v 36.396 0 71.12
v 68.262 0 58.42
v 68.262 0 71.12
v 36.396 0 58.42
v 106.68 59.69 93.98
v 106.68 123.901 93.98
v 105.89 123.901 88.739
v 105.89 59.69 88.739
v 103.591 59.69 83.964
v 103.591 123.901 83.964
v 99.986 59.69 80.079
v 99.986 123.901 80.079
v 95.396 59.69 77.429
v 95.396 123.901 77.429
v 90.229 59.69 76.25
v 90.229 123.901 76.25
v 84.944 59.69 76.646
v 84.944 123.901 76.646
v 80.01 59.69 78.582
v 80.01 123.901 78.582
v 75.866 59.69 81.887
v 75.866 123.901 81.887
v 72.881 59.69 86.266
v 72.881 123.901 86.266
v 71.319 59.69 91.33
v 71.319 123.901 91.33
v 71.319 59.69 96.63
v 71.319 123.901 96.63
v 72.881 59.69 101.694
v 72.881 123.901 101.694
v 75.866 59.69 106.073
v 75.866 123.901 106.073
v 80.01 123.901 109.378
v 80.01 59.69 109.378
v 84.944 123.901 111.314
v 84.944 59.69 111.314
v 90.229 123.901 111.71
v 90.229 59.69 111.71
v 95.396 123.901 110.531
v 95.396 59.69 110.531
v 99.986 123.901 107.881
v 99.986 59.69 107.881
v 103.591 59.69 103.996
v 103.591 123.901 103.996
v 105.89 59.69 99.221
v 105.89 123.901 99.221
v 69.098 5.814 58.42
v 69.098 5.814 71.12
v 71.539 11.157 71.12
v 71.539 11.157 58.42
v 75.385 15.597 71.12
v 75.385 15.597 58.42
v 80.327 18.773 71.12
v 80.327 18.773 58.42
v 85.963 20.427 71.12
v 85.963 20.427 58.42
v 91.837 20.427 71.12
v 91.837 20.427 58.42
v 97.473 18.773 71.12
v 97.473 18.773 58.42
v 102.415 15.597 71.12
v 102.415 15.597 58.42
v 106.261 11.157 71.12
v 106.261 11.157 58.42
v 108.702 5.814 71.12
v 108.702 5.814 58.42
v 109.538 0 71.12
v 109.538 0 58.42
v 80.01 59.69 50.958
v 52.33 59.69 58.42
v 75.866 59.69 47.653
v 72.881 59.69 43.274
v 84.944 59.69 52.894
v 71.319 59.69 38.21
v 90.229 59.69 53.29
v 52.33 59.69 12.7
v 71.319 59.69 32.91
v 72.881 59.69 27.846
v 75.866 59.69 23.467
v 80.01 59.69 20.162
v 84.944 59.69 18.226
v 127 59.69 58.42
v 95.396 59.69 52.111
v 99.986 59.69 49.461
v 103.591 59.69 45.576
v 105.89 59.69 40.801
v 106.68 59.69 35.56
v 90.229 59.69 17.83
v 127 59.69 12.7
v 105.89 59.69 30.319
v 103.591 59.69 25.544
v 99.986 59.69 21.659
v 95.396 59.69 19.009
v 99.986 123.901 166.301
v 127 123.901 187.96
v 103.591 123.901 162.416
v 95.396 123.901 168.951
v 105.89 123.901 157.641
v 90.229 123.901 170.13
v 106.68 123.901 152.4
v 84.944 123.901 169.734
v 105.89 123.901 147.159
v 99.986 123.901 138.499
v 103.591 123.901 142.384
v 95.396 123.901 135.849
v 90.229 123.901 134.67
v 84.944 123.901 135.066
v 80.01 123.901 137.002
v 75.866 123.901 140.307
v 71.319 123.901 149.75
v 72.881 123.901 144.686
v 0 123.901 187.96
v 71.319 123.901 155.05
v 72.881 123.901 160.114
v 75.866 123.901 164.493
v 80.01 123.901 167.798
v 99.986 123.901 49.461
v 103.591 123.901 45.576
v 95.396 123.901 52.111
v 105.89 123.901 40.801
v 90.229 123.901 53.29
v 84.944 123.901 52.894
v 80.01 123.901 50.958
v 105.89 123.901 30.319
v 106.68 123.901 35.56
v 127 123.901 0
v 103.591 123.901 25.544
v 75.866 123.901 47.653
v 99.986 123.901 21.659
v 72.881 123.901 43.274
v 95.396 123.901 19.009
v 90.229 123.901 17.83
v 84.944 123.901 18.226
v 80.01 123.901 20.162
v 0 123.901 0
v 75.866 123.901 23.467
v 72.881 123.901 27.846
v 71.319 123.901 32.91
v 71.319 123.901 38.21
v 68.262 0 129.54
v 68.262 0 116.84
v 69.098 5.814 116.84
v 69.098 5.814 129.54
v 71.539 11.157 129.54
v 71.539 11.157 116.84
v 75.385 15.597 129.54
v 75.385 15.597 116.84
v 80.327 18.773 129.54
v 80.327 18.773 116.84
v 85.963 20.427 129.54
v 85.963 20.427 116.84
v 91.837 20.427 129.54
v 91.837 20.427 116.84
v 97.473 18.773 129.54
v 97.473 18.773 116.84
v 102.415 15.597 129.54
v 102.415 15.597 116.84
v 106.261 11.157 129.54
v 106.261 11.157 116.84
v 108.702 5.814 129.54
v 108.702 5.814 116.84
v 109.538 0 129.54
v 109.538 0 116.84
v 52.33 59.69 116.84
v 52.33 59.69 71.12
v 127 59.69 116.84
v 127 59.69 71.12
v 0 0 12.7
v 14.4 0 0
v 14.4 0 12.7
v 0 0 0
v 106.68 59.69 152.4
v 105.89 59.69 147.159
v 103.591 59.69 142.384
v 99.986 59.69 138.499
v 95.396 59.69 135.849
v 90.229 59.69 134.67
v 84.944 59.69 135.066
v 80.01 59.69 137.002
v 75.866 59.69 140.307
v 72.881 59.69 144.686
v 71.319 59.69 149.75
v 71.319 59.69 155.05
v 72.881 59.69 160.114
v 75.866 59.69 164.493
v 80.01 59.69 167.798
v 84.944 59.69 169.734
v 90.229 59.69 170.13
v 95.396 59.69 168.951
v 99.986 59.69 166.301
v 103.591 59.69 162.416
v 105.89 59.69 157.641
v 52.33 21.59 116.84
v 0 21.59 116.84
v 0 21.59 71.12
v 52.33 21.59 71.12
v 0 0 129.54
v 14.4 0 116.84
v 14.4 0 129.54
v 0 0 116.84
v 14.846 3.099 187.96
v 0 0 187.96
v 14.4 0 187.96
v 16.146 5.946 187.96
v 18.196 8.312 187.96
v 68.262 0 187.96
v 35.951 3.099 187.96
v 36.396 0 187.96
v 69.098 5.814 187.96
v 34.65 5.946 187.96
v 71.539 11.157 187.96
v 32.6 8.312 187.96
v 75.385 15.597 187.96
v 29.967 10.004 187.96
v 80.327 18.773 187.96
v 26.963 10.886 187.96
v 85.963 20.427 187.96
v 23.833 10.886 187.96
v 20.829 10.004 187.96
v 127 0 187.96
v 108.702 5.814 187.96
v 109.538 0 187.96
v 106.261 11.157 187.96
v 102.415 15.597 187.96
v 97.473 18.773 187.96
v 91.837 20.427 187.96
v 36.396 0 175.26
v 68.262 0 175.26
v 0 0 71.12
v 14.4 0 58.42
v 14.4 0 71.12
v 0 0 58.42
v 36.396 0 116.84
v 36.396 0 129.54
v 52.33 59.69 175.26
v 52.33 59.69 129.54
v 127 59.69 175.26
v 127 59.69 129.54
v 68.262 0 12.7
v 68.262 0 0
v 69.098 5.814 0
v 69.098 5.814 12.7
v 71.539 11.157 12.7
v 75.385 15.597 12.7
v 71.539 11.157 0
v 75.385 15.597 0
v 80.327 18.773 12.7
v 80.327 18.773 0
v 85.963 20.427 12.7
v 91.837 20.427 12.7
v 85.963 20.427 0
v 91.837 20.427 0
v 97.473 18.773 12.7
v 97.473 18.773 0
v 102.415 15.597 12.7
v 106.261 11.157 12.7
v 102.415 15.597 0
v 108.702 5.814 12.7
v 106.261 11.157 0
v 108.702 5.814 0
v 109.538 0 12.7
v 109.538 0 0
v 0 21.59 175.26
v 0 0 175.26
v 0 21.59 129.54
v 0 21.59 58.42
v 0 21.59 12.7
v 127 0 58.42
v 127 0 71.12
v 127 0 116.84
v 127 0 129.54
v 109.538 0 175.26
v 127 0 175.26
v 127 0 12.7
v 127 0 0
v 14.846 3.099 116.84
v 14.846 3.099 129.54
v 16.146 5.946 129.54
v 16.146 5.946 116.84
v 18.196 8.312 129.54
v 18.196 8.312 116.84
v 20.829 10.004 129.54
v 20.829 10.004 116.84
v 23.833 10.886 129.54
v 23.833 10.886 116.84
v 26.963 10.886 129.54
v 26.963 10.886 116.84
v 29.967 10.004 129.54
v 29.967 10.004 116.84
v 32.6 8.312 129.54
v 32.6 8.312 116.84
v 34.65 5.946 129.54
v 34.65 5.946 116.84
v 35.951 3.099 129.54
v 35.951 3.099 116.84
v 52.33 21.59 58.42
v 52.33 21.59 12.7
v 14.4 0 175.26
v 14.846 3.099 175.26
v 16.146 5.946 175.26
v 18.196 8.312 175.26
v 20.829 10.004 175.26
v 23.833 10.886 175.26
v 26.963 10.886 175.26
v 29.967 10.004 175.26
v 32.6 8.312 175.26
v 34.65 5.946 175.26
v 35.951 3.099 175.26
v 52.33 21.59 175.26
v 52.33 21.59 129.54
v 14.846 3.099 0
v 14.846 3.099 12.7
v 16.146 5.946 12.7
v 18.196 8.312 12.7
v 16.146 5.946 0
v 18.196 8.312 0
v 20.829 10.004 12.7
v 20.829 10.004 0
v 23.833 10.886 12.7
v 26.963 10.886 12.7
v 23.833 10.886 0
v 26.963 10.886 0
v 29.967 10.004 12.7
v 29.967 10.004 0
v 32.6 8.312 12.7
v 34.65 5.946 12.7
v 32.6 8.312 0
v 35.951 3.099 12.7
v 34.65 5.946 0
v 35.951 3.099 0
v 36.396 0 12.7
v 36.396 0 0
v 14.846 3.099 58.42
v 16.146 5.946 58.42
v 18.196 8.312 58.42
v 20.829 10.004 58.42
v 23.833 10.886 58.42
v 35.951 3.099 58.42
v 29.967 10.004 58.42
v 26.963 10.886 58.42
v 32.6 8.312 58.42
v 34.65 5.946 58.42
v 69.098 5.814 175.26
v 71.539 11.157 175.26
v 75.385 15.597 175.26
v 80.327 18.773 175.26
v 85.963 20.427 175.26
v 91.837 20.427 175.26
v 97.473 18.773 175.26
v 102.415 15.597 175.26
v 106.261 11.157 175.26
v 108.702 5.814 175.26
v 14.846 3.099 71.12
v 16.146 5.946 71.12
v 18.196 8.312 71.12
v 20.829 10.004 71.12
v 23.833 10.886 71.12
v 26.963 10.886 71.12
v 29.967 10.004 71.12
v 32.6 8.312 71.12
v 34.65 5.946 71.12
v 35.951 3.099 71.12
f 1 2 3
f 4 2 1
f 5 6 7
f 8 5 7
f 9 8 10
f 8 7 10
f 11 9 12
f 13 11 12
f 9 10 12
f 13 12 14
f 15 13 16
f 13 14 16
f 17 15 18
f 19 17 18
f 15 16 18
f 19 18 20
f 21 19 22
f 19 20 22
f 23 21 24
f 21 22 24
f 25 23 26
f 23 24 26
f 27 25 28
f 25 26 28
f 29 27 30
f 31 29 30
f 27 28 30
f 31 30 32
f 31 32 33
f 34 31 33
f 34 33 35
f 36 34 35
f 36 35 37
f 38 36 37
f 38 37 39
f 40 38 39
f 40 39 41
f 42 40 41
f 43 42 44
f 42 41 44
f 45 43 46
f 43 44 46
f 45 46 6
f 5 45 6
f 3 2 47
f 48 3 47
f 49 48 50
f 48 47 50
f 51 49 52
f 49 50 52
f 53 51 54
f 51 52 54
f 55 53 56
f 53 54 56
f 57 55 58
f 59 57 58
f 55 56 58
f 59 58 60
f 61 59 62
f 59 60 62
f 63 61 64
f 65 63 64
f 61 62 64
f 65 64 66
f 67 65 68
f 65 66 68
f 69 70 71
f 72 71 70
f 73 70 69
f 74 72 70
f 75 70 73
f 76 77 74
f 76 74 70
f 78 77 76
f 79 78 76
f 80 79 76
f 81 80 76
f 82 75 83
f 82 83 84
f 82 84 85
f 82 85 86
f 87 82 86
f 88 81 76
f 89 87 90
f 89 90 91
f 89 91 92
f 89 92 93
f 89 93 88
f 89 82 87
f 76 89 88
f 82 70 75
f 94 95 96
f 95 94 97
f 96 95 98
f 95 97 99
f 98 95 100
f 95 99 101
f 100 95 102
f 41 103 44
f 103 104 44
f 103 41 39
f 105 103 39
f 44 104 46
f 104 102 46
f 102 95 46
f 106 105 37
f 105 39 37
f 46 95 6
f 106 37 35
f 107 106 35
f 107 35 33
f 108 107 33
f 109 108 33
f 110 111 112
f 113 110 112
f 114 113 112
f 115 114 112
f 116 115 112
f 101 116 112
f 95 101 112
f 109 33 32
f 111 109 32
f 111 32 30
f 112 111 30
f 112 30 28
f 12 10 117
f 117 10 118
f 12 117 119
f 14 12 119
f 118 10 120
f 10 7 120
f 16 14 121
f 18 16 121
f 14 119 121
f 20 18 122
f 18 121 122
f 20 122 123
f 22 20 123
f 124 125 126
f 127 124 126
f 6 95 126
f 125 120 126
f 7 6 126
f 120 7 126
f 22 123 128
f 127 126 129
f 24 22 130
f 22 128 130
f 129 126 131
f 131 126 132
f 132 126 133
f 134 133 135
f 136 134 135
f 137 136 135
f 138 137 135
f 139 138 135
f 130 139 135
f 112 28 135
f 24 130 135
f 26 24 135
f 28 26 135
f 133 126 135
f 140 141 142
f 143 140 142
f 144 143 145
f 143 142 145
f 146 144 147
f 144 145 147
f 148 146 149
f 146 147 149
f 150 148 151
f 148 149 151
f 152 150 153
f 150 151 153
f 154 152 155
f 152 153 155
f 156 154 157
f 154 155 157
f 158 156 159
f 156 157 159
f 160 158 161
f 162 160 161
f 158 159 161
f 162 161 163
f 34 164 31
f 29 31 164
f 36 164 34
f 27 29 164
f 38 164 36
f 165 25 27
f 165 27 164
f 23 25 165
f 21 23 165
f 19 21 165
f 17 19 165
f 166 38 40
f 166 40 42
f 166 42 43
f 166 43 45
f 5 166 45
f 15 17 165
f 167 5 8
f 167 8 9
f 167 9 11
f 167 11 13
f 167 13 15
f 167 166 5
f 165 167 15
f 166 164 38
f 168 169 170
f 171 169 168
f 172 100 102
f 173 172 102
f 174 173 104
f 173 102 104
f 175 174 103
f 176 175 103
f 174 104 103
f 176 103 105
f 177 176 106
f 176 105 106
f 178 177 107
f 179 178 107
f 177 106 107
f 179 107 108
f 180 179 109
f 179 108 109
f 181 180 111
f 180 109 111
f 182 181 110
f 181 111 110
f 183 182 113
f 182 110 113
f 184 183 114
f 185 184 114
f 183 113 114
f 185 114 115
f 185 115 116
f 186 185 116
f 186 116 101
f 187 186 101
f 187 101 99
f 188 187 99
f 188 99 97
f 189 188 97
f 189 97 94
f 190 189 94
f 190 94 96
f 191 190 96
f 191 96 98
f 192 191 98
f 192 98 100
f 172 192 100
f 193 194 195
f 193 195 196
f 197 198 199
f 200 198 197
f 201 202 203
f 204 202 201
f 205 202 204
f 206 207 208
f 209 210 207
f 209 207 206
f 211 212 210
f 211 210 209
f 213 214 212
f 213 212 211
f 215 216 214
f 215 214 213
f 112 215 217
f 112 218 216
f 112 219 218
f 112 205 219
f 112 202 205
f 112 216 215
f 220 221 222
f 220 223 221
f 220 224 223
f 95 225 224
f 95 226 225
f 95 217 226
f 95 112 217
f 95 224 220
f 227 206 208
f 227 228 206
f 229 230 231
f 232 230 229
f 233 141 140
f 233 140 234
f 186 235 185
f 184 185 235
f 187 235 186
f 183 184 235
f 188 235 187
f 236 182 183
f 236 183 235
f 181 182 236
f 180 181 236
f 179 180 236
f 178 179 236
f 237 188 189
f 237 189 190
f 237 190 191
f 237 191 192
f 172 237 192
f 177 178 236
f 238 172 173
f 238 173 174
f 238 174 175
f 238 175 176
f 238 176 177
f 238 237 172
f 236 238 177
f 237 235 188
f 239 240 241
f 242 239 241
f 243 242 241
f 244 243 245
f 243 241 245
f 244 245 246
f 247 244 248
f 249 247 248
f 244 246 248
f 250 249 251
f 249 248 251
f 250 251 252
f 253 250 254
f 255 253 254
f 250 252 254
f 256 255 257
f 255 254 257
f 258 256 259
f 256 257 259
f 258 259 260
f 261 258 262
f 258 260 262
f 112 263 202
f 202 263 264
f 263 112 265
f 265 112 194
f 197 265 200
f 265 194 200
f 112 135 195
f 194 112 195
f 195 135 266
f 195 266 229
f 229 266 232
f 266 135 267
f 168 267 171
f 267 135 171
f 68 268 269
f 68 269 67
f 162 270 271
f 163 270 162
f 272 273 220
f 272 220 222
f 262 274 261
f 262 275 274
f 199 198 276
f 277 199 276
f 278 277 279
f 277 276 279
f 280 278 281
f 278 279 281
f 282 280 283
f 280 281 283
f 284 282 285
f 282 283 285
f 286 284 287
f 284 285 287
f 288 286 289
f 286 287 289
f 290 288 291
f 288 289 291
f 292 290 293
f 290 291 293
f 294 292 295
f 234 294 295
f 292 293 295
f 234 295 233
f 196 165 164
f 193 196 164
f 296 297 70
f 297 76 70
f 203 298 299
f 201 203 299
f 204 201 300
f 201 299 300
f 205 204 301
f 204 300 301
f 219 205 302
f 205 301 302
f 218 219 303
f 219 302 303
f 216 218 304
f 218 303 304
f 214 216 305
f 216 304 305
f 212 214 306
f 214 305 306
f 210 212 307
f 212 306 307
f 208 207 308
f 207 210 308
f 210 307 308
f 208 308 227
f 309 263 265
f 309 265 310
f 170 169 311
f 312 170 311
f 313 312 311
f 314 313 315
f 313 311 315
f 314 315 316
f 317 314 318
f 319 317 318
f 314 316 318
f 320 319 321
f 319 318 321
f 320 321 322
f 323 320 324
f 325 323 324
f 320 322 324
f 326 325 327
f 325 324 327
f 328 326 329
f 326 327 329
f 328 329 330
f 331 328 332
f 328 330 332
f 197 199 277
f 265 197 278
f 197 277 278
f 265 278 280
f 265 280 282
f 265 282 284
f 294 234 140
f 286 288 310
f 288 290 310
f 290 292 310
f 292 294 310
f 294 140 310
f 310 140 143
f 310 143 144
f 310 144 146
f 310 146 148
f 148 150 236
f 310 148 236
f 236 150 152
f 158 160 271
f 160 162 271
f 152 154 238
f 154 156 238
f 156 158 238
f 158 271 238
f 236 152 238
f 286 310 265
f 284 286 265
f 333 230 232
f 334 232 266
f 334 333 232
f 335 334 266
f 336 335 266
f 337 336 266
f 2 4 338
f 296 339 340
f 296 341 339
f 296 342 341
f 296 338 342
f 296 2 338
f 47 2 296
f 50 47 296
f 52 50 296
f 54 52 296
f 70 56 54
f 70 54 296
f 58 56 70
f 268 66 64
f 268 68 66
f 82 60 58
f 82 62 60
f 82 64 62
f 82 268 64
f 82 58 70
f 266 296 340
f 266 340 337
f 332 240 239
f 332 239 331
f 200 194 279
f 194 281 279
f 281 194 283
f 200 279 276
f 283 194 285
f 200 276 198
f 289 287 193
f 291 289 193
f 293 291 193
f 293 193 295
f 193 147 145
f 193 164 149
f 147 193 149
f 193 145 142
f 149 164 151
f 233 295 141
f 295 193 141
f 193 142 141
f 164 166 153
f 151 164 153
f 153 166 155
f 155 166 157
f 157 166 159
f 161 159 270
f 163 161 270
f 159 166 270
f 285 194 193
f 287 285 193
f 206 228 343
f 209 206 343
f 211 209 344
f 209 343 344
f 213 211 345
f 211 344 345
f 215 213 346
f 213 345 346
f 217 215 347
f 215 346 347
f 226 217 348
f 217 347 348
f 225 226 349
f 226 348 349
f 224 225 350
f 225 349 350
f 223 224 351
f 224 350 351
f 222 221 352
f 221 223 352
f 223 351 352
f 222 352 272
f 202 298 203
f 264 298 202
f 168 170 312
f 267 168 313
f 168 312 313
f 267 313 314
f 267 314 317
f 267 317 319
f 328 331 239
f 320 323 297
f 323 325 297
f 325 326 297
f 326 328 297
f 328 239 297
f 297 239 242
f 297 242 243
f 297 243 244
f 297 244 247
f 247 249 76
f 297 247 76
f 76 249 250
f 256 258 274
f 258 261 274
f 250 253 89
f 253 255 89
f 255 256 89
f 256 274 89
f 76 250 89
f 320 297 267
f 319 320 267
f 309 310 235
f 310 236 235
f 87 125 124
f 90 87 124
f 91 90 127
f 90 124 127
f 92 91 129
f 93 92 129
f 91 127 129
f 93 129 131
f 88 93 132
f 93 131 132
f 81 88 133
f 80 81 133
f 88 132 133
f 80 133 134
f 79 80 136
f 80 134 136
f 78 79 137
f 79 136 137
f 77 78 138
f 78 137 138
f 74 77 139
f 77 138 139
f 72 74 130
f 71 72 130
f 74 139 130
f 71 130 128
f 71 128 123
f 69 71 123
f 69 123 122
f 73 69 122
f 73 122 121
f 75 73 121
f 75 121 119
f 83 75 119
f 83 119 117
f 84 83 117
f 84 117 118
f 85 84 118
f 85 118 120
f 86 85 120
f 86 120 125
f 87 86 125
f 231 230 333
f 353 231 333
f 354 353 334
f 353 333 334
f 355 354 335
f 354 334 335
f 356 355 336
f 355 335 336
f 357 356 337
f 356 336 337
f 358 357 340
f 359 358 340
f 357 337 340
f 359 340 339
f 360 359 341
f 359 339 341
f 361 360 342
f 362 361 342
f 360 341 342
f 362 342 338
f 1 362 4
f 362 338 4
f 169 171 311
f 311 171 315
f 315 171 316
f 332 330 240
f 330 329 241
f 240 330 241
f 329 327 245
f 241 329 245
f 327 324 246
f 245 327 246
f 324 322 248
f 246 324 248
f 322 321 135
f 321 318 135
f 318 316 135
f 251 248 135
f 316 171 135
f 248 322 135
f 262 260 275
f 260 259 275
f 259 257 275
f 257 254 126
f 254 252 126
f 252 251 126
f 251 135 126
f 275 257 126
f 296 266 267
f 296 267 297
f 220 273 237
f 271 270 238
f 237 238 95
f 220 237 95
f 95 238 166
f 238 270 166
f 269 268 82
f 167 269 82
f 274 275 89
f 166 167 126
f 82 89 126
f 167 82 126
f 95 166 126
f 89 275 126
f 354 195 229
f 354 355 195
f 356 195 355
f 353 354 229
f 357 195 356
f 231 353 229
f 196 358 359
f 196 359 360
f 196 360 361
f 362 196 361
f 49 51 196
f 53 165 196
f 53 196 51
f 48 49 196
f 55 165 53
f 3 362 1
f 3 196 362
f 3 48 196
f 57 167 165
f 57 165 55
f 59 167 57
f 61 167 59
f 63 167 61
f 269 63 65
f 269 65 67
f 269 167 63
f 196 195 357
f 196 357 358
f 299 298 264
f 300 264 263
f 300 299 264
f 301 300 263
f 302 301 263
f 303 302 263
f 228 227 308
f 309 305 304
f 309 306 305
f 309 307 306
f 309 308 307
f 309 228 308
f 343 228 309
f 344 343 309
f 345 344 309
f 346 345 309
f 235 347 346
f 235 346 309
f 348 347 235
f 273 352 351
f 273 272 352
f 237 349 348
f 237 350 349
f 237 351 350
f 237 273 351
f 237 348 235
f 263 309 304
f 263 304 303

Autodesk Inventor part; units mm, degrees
ref_plane "YZ Plane" through (0, 0, 0) normal (1, 0, 0) x (0, 1, 0)
ref_plane "XZ Plane" through (0, 0, 0) normal (0, 1, 0) x (-1, 0, 0)
ref_plane "XY Plane" through (0, 0, 0) normal (0, 0, 1) x (1, 0, 0)
sketch "Sketch1" plane through (0, 0, 0) normal (0, 0, 1) x (1, 0, 0)
  line L0 (127, 0) -> (127, 123.9012)
  line L1 (127, 123.9012) -> (0, 123.9012)
  line L2 (0, 123.9012) -> (0, 0)
  arc A0 (109.5375, 0) -> (68.2625, 0) centre (88.9, 0) ccw
  arc A1 (36.3964, 0) -> (14.4, 0) centre (25.3982, 0) ccw
  line L3 (14.4, 0) -> (0, 0)
  line L4 (127, 0) -> (109.5375, 0)
  line L5 (68.2625, 0) -> (36.3964, 0)
  dimension "d0" = 127
  dimension "d1" = 123.9012
  dimension "d2" = 41.275
  dimension "d25" = 38.1
  dimension "d26" = 21.9964
extrude "Extrusion1" add sketch "Sketch1" along normal blind 187.96
sketch "Sketch2" plane through (0, 123.9012, 0) normal (0, 1, 0) x (1, 0, 0)
  circle A0 centre (88.9, -152.4) radius 17.78
  line L0 (127, -187.96) -> (0, -187.96) projected
  line L1 (127, 0) -> (127, -187.96) projected
  circle A1 centre (88.9, -93.98) radius 17.78
  circle A2 centre (88.9, -35.56) radius 17.78
  line L2 (127, 0) -> (0, 0) projected
  point P0 (127, -35.56)
  point P1 (127, -93.98)
  point P2 (127, -152.4)
  dimension "d6" = 35.56
  dimension "d7" = 38.1
  dimension "d10" = 35.56
  dimension "d11" = 38.1
  dimension "d13" = 58.42
  dimension "d14" = 38.1
  dimension "d29" = 35.56
sketch "Sketch3" plane through (127, 0, 0) normal (1, 0, 0) x (0, 0, -1)
  line L0 (0, 123.9012) -> (-187.96, 123.9012) projected
  line L1 (0, 0) -> (-187.96, 0) projected
  line L2 (-35.56, 59.69) -> (-35.56, 0)
  line L3 (0, 0) -> (-187.96, 0) projected
  line L4 (-93.98, 0) -> (-93.98, 59.69)
  line L5 (-152.4, 59.69) -> (-152.4, 0)
  line L6 (0, 0) -> (0, 123.9012) projected
  line L7 (-187.96, 0) -> (-175.26, 0)
  line L8 (-175.26, 0) -> (-175.26, 59.69)
  line L9 (-175.26, 123.9012) -> (-187.96, 123.9012)
  line L10 (-187.96, 123.9012) -> (-187.96, 0)
  line L11 (-116.84, 0) -> (-129.54, 0)
  line L12 (-129.54, 0) -> (-129.54, 59.69)
  line L13 (-129.54, 123.9012) -> (-116.84, 123.9012)
  line L14 (-116.84, 59.69) -> (-116.84, 0)
  line L15 (-35.56, 59.69) -> (-35.56, 0)
  line L16 (0, 0) -> (-12.7, 0)
  line L17 (-12.7, 0) -> (-12.7, 59.69)
  line L18 (-12.7, 123.9012) -> (0, 123.9012)
  line L19 (0, 123.9012) -> (0, 0)
  line L20 (-71.12, 0) -> (-58.42, 0)
  line L21 (-58.42, 0) -> (-58.42, 59.69)
  line L22 (-58.42, 123.9012) -> (-71.12, 123.9012)
  line L23 (-71.12, 59.69) -> (-71.12, 0)
  line L24 (-187.96, 123.9012) -> (-187.96, 0) projected
  line L25 (-187.96, 123.9012) -> (0, 123.9012)
  line L26 (-58.42, 59.69) -> (-12.7, 59.69)
  line L27 (-175.26, 59.69) -> (-129.54, 59.69)
  line L28 (-116.84, 59.69) -> (-71.12, 59.69)
  dimension "d15" = 35.56
  dimension "d16" = 93.98
  dimension "d17" = 152.4
  dimension "d18" = 12.7
extrude "Extrusion2" cut sketch "Sketch3" against normal blind 187.96 contours L1 L2 L26 L17 | L1 L21 L26 L2 | L1 L4 L28 L23 | L1 L14 L28 L4 | L1 L5 L27 L12 | L8 L27 L5 L1
extrude "Extrusion3" cut sketch "Sketch2" against normal blind 187.96
sketch "Sketch4" plane through (127, 59.69, 129.54) normal (0, -1, 0) x (1, 0, 0)
  line L0 (-58.7375, -116.84) -> (-90.6036, -116.84) projected
  line L1 (-74.6705, -116.84) -> (-74.6705, 45.72)
  line L2 (-90.6036, 45.72) -> (-58.7375, 45.72) projected
  line L3 (-74.6705, 45.72) -> (-127, 45.72)
  line L4 (-127, -116.84) -> (-127, -71.12) projected
  line L5 (-127, 45.72) -> (-127, -116.84)
  line L6 (-127, -116.84) -> (-74.6705, -116.84)
  point P0 (-127, -129.54)
extrude "Extrusion4" add sketch "Sketch4" along normal blind 38.1
properties part number "E.Engine Block Top"
